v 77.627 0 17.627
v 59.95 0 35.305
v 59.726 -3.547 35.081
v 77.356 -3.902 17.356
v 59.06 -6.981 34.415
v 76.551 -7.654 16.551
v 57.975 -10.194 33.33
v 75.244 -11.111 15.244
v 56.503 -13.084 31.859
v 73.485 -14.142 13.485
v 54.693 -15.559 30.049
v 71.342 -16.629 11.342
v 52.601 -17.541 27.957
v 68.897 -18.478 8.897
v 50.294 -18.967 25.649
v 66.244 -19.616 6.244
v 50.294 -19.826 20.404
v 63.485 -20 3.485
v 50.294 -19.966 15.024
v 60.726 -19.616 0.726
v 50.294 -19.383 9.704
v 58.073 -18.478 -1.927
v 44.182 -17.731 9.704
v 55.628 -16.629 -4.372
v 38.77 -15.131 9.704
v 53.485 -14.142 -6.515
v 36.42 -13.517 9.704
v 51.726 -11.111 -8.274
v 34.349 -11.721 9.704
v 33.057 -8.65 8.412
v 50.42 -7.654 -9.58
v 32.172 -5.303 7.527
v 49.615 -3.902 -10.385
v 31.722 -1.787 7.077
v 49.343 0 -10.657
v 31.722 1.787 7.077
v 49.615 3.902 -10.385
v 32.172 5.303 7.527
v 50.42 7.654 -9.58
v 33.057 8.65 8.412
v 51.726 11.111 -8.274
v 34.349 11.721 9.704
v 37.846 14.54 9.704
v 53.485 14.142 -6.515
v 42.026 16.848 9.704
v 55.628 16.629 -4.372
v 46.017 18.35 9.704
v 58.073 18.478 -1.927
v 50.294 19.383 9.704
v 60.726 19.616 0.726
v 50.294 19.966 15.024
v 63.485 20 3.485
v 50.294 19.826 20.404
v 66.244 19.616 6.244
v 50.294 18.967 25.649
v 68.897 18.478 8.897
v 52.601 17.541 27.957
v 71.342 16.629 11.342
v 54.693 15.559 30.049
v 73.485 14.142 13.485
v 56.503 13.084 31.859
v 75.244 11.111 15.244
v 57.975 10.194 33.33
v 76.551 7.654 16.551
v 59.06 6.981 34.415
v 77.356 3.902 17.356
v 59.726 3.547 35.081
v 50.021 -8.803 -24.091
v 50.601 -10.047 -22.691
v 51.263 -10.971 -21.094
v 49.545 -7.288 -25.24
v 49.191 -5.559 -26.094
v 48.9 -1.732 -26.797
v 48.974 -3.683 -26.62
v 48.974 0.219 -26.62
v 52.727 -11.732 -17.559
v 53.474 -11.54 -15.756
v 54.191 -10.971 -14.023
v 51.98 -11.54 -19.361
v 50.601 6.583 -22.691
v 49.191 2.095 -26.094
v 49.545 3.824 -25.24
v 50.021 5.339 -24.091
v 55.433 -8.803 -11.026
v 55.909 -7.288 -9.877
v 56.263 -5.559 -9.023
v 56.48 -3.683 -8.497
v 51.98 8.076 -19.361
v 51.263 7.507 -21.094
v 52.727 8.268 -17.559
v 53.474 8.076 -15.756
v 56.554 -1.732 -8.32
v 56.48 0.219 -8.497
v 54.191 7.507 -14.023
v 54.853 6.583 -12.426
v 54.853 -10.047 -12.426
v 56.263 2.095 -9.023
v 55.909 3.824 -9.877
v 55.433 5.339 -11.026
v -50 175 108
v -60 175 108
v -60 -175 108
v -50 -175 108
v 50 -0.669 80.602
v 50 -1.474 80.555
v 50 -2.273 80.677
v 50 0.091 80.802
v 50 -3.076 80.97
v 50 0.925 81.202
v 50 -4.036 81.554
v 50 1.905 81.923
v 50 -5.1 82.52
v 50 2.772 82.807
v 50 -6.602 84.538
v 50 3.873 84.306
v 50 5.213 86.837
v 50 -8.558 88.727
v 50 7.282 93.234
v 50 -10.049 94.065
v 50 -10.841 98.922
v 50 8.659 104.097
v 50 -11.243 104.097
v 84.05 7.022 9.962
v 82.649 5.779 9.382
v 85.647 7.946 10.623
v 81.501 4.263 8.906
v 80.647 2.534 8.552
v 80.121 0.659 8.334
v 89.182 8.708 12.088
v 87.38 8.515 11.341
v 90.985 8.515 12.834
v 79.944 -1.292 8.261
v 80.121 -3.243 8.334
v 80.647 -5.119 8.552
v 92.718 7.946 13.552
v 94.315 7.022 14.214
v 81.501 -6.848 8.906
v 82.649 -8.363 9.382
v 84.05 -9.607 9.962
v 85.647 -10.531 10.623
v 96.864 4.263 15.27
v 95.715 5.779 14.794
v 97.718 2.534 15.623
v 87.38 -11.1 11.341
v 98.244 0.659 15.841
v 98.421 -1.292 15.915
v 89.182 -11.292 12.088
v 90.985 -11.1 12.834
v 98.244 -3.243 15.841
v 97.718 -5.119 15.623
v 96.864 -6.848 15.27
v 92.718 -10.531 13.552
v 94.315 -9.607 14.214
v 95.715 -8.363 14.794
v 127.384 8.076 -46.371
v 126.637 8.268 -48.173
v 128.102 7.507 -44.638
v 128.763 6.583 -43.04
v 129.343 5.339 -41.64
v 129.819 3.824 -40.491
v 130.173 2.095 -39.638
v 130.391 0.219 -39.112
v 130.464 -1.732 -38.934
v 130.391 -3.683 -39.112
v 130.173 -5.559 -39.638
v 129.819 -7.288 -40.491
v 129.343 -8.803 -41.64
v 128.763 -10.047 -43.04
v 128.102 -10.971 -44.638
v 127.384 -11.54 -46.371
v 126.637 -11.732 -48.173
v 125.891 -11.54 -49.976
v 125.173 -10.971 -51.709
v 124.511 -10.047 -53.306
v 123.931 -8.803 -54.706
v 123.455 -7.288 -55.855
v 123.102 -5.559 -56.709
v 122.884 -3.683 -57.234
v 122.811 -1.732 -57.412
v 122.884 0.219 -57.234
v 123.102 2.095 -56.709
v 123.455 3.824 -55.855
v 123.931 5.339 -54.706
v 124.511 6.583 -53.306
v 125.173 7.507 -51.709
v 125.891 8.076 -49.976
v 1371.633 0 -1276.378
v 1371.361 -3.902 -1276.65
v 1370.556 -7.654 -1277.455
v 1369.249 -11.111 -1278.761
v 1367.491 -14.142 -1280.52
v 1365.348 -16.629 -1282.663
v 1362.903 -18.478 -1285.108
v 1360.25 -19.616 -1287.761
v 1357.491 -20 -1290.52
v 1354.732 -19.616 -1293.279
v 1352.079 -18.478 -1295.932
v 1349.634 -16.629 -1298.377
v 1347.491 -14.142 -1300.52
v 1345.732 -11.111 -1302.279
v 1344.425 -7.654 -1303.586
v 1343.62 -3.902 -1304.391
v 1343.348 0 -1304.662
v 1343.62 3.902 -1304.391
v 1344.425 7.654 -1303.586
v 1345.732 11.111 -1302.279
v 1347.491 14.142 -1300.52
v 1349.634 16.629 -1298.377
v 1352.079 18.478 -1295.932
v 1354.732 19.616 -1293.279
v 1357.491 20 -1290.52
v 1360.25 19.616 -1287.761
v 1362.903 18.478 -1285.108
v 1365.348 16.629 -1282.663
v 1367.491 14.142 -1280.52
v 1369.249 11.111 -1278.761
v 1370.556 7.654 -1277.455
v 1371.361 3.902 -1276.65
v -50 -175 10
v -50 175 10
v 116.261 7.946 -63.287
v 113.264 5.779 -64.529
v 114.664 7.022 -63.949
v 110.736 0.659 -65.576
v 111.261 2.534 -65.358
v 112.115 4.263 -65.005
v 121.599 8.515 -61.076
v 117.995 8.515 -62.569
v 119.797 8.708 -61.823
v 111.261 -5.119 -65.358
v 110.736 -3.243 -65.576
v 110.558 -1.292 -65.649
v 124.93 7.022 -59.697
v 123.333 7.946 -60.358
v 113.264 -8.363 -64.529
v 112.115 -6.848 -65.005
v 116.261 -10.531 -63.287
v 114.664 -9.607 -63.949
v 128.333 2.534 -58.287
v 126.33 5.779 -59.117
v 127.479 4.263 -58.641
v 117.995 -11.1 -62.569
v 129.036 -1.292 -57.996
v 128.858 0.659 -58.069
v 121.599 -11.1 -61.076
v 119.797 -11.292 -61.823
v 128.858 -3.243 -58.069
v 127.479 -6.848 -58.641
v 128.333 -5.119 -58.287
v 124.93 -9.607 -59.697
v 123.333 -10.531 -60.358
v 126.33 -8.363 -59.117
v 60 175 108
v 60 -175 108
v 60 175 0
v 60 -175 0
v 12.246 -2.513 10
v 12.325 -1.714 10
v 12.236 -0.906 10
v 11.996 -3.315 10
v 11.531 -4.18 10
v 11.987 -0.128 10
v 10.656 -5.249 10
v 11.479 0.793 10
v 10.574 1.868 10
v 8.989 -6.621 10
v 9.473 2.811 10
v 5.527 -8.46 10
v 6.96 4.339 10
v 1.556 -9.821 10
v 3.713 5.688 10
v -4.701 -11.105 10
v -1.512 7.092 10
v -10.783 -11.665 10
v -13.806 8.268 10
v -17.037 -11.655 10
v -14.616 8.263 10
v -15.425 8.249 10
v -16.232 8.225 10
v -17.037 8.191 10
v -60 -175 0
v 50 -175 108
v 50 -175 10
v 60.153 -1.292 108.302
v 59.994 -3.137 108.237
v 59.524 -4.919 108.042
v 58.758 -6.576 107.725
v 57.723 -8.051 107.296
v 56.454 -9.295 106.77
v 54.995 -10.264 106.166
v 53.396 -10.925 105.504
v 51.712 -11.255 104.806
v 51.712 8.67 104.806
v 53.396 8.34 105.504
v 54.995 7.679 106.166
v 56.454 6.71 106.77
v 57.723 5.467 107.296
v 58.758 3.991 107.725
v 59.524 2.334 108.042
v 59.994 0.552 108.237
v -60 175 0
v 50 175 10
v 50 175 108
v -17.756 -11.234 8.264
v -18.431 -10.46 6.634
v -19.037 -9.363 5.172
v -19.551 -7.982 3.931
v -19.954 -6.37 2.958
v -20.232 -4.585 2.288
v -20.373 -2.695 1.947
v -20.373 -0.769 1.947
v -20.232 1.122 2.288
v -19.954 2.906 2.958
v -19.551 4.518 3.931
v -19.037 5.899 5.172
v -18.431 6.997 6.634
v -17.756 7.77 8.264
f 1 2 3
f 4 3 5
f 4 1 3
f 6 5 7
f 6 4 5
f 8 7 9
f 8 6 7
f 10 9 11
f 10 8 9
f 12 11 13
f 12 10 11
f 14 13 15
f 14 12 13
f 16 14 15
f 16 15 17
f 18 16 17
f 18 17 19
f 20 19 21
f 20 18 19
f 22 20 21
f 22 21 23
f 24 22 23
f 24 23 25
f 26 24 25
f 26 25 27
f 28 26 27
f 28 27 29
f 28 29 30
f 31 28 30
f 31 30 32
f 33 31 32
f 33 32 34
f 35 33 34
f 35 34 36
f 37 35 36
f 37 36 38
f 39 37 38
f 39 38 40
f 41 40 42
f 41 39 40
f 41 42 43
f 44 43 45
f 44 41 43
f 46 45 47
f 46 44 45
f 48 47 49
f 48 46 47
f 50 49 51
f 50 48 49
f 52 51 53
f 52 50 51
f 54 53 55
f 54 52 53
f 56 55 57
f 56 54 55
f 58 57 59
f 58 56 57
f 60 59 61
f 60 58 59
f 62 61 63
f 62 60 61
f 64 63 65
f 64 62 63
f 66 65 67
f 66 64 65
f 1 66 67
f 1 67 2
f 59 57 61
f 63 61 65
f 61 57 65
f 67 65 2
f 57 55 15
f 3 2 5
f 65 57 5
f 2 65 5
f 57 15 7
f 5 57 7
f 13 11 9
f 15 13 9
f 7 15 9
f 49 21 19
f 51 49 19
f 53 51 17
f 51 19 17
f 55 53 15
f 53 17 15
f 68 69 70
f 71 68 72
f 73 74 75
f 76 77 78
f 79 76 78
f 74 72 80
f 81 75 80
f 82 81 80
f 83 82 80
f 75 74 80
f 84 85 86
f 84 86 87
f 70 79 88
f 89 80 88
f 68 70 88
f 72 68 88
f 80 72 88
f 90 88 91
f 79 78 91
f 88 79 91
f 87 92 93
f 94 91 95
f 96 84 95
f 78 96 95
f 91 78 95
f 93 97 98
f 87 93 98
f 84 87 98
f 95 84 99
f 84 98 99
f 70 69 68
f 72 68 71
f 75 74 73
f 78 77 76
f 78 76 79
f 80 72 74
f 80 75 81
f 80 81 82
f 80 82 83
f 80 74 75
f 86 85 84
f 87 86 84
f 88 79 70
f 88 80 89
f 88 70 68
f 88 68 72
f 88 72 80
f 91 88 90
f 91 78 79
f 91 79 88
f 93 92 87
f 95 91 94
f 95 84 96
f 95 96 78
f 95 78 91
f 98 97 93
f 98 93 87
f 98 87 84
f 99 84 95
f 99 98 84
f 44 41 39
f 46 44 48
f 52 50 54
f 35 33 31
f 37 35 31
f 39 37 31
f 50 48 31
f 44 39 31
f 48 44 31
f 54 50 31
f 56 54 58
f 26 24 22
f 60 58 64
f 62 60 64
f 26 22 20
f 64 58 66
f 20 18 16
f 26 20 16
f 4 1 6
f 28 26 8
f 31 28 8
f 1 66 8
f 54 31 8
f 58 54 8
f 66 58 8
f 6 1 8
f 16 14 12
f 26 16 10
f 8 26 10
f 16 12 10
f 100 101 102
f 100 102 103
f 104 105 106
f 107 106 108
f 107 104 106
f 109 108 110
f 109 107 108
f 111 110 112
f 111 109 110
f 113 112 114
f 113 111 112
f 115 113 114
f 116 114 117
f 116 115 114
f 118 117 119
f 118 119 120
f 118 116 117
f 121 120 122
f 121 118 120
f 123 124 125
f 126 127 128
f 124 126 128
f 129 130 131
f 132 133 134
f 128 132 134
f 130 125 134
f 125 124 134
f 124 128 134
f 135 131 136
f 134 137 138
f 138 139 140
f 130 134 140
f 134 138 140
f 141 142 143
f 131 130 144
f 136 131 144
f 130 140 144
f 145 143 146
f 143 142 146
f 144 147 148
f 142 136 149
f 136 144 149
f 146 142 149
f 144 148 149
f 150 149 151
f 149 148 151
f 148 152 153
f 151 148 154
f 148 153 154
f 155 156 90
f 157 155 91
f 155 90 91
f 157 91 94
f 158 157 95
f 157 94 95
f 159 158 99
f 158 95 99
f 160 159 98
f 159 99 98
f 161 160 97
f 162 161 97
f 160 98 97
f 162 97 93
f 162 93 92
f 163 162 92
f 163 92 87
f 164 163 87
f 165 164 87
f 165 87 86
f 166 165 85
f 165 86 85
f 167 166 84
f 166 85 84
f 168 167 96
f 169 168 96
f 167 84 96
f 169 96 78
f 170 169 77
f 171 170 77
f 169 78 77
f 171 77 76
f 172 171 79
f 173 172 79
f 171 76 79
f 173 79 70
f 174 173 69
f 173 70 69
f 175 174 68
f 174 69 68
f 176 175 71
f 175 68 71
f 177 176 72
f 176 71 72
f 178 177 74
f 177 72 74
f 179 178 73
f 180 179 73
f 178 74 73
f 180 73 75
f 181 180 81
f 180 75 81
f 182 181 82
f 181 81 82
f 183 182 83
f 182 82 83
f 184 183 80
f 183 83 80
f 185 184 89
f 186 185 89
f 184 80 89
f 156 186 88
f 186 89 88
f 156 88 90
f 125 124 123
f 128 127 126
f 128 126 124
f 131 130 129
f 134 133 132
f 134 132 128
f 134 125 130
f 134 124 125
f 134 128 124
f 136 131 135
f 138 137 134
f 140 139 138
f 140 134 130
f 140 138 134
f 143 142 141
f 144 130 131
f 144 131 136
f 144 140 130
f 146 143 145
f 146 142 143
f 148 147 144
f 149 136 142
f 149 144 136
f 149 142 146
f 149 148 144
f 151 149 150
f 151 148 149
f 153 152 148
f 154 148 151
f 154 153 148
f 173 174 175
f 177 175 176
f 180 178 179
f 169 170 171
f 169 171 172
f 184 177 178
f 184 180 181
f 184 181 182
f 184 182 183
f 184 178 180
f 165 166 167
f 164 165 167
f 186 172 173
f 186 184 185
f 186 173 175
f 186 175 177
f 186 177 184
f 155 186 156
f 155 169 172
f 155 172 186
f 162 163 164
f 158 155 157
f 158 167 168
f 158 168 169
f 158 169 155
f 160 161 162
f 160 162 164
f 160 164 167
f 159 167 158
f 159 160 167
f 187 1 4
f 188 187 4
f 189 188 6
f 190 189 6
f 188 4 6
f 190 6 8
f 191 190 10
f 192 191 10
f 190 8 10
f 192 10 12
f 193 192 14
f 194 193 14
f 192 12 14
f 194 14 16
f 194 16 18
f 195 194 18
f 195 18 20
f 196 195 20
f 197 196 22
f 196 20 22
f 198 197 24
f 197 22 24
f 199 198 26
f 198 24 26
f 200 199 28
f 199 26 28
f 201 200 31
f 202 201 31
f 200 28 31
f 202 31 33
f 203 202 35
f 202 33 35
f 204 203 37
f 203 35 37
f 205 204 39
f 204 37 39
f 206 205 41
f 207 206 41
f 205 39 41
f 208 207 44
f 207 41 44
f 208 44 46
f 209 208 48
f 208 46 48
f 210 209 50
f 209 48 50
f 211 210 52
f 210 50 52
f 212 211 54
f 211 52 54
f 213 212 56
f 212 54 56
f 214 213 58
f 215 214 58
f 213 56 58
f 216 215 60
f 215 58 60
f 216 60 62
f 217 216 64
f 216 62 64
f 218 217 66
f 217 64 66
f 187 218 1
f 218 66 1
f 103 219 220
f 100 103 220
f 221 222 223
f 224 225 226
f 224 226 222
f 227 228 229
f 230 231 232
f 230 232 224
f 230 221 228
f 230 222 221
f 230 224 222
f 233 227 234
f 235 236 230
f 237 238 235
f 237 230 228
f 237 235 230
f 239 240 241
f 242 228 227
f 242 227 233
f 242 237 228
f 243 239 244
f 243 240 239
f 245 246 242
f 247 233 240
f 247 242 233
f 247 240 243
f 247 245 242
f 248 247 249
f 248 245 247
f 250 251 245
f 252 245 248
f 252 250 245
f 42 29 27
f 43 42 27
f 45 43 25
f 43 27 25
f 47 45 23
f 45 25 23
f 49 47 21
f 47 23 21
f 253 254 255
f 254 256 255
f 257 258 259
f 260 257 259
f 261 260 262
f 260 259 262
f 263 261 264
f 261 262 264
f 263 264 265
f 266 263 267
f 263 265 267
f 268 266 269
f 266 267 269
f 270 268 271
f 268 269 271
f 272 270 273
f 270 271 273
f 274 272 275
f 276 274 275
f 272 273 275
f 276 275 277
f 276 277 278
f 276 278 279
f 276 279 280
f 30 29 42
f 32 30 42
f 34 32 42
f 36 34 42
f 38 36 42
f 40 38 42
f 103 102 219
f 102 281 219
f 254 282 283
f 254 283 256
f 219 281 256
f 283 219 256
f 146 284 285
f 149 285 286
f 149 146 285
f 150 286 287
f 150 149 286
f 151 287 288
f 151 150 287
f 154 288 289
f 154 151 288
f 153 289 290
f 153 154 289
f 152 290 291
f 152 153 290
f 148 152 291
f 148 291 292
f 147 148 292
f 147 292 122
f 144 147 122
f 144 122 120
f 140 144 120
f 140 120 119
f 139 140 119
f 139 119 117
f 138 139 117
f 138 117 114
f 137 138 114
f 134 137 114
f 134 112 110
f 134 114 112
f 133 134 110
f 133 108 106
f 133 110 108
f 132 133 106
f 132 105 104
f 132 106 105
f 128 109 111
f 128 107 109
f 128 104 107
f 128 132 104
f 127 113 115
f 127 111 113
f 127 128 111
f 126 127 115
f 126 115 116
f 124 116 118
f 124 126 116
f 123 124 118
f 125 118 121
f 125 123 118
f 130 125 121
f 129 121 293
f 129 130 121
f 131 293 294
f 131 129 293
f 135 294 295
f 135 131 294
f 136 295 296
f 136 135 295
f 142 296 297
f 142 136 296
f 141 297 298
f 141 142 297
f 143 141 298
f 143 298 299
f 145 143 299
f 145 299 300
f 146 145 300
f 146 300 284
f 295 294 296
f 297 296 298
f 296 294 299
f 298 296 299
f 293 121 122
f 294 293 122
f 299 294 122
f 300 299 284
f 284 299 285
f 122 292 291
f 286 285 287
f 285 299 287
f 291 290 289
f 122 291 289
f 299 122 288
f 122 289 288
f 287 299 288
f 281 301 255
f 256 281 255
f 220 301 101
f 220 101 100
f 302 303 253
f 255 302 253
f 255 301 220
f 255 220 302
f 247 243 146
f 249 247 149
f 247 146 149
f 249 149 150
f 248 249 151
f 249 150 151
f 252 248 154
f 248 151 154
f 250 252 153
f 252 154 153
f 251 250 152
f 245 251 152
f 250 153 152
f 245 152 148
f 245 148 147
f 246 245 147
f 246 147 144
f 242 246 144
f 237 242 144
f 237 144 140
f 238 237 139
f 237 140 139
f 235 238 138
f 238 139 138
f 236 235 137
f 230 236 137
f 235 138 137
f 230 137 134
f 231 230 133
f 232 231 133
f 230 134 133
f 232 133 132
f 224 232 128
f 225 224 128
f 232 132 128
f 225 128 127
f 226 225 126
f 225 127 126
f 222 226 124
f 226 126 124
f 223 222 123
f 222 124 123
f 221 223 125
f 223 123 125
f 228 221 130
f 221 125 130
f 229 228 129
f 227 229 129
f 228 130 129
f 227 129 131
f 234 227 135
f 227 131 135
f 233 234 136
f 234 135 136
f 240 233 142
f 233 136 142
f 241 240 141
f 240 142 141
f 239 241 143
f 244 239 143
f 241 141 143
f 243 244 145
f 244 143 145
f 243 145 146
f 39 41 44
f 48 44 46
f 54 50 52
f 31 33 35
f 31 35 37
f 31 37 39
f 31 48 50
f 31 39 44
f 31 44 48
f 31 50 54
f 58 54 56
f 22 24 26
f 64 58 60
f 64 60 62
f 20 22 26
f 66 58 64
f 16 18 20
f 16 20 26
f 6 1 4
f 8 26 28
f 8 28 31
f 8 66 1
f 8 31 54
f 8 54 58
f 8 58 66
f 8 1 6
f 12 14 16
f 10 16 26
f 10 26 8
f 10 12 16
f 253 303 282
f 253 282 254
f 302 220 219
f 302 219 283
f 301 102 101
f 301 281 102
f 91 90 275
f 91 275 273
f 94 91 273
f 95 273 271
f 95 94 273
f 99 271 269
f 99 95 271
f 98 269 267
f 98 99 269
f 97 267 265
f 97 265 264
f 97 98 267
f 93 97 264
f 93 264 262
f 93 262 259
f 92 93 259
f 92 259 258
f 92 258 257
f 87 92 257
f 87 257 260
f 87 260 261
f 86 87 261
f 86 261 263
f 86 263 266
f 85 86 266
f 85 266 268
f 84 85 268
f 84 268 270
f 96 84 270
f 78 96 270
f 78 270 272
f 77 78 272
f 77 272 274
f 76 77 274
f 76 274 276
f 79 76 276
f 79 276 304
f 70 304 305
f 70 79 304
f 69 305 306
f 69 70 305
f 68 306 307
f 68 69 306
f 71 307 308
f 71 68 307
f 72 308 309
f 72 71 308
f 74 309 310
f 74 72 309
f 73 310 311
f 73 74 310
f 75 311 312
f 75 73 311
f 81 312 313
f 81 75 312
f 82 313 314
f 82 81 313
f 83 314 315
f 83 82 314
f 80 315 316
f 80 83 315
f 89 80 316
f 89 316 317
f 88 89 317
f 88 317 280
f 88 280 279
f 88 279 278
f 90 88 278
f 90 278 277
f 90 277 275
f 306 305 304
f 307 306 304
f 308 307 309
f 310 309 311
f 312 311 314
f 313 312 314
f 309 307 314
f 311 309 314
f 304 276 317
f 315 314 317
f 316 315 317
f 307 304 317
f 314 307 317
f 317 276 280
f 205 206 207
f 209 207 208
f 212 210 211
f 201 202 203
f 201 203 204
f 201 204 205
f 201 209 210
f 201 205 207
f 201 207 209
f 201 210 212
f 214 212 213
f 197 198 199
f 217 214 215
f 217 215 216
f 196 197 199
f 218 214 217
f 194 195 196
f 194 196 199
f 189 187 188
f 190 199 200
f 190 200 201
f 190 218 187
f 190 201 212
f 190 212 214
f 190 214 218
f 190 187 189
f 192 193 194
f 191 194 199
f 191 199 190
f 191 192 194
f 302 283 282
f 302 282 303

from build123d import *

# Parameters (mm, degrees)
F0_W      = 120
F0_H      = 350
F1_DEPTH  = 10
F2_W      = 10
F2_H      = 350
F4_DEPTH  = 98
F3_W      = 10
F3_H      = 350
F5_DEPTH  = 98
F7_R      = 20
F8_DEPTH  = 1830
F9_DEPTH  = 25
F11_W     = 16
F11_H     = 16.2
F12_DEPTH = 60
F15_R     = 10
F16_DEPTH = 100
F17_DEPTH = 80
F18_R     = 10
F19_DEPTH = 80
F20_DEPTH = 75
F22_W     = 99.9921187758
F22_H     = 98.00377395
F23_DEPTH = 200


with BuildPart() as f1:
    # F0 (on Top) → F1 (new body)
    with BuildSketch(Plane.XY):
        Rectangle(F0_W, F0_H)
    extrude(amount=F1_DEPTH)

    # F2 (on face) → F4 (join)
    with BuildSketch(Plane.XY.offset(10)):
        with Locations((55, 0)):
            Rectangle(F2_W, F2_H)
    extrude(amount=F4_DEPTH)

    # F3 (on face) → F5 (join)
    with BuildSketch(Plane.XY.offset(10)):
        with Locations((-55, 0)):
            Rectangle(F3_W, F3_H)
    extrude(amount=F5_DEPTH)


with BuildPart() as f8:
    # F7 (on face) → F8 (new body)
    with BuildSketch(Plane(origin=(30, 0, -30), x_dir=(0.7071067812, 0, 0.7071067812), z_dir=(0.7071067812, 0, -0.7071067812))):
        with Locations((47.3552543556, 0)):
            Circle(F7_R)
    extrude(amount=F8_DEPTH)


with BuildPart() as f9:
    # F9 (new): a face of the model
    f9_faces = [f8.part.faces().sort_by_distance(p)[0] for p in [
        (63.4852214797, 0, 3.4852214797),
    ]]
    extrude(f9_faces, amount=F9_DEPTH)

    # F11 (on offset) → F12 (cut)
    with BuildSketch(Plane.XZ.offset(25)):
        with Locations((42.2938987613, 17.8038550502)):
            Rectangle(F11_W, F11_H)
    extrude(amount=-F12_DEPTH, mode=Mode.SUBTRACT)


with BuildPart() as f16:
    # F15 (on face) → F16 (new body)
    with BuildSketch(Plane(origin=(8.7867965644, 0, -21.2132034356), x_dir=(0.9238795325, 0, 0.3826834324), z_dir=(0.3826834324, 0, -0.9238795325))):
        with Locations((87.0194658637, 1.2923743343)):
            Circle(F15_R)
    extrude(amount=-F16_DEPTH)


with BuildPart() as f17:
    # F17 (new): a face of the model
    f17_faces = [f16.part.faces().sort_by_distance(p)[0] for p in [
        (89.1823000059, -1.2923743343, 12.0877044437),
    ]]
    extrude(f17_faces, amount=F17_DEPTH)


with BuildPart() as f19:
    # F18 (on face) → F19 (new body)
    with BuildSketch(Plane(origin=(51.2132034356, 0, -21.2132034356), x_dir=(0, 1, 0), z_dir=(0.9238795325, 0, -0.3826834324))):
        with Locations((-1.7318965402, 3.955797758)):
            Circle(F18_R)
    extrude(amount=F19_DEPTH)


with BuildPart() as f20:
    # F20 (new): a face of the model
    f20_faces = [f19.part.faces().sort_by_distance(p)[0] for p in [
        (52.7270216994, -1.7318965402, -17.5585228523),
    ]]
    extrude(f20_faces, amount=F20_DEPTH)


with BuildPart() as f23_tool:
    # F22 (on offset) → F23 (new body)
    with BuildSketch(Plane(origin=(0, 175, 0), x_dir=(-1, 0, 0), z_dir=(0, 1, 0))):
        with Locations((-0.0039339066, 59.0021540411)):
            Rectangle(F22_W, F22_H)
    extrude(amount=-F23_DEPTH)


with BuildPart() as f16_1:
    add(f16.part)

    # F23: cut by f23_tool
    add(f23_tool.part, mode=Mode.SUBTRACT)


with BuildPart() as f20_1:
    add(f20.part)

    # F23: cut by f23_tool
    add(f23_tool.part, mode=Mode.SUBTRACT)


solid = Compound([f1.part, f8.part, f9.part, f17.part, f19.part, f16_1.part, f20_1.part])
